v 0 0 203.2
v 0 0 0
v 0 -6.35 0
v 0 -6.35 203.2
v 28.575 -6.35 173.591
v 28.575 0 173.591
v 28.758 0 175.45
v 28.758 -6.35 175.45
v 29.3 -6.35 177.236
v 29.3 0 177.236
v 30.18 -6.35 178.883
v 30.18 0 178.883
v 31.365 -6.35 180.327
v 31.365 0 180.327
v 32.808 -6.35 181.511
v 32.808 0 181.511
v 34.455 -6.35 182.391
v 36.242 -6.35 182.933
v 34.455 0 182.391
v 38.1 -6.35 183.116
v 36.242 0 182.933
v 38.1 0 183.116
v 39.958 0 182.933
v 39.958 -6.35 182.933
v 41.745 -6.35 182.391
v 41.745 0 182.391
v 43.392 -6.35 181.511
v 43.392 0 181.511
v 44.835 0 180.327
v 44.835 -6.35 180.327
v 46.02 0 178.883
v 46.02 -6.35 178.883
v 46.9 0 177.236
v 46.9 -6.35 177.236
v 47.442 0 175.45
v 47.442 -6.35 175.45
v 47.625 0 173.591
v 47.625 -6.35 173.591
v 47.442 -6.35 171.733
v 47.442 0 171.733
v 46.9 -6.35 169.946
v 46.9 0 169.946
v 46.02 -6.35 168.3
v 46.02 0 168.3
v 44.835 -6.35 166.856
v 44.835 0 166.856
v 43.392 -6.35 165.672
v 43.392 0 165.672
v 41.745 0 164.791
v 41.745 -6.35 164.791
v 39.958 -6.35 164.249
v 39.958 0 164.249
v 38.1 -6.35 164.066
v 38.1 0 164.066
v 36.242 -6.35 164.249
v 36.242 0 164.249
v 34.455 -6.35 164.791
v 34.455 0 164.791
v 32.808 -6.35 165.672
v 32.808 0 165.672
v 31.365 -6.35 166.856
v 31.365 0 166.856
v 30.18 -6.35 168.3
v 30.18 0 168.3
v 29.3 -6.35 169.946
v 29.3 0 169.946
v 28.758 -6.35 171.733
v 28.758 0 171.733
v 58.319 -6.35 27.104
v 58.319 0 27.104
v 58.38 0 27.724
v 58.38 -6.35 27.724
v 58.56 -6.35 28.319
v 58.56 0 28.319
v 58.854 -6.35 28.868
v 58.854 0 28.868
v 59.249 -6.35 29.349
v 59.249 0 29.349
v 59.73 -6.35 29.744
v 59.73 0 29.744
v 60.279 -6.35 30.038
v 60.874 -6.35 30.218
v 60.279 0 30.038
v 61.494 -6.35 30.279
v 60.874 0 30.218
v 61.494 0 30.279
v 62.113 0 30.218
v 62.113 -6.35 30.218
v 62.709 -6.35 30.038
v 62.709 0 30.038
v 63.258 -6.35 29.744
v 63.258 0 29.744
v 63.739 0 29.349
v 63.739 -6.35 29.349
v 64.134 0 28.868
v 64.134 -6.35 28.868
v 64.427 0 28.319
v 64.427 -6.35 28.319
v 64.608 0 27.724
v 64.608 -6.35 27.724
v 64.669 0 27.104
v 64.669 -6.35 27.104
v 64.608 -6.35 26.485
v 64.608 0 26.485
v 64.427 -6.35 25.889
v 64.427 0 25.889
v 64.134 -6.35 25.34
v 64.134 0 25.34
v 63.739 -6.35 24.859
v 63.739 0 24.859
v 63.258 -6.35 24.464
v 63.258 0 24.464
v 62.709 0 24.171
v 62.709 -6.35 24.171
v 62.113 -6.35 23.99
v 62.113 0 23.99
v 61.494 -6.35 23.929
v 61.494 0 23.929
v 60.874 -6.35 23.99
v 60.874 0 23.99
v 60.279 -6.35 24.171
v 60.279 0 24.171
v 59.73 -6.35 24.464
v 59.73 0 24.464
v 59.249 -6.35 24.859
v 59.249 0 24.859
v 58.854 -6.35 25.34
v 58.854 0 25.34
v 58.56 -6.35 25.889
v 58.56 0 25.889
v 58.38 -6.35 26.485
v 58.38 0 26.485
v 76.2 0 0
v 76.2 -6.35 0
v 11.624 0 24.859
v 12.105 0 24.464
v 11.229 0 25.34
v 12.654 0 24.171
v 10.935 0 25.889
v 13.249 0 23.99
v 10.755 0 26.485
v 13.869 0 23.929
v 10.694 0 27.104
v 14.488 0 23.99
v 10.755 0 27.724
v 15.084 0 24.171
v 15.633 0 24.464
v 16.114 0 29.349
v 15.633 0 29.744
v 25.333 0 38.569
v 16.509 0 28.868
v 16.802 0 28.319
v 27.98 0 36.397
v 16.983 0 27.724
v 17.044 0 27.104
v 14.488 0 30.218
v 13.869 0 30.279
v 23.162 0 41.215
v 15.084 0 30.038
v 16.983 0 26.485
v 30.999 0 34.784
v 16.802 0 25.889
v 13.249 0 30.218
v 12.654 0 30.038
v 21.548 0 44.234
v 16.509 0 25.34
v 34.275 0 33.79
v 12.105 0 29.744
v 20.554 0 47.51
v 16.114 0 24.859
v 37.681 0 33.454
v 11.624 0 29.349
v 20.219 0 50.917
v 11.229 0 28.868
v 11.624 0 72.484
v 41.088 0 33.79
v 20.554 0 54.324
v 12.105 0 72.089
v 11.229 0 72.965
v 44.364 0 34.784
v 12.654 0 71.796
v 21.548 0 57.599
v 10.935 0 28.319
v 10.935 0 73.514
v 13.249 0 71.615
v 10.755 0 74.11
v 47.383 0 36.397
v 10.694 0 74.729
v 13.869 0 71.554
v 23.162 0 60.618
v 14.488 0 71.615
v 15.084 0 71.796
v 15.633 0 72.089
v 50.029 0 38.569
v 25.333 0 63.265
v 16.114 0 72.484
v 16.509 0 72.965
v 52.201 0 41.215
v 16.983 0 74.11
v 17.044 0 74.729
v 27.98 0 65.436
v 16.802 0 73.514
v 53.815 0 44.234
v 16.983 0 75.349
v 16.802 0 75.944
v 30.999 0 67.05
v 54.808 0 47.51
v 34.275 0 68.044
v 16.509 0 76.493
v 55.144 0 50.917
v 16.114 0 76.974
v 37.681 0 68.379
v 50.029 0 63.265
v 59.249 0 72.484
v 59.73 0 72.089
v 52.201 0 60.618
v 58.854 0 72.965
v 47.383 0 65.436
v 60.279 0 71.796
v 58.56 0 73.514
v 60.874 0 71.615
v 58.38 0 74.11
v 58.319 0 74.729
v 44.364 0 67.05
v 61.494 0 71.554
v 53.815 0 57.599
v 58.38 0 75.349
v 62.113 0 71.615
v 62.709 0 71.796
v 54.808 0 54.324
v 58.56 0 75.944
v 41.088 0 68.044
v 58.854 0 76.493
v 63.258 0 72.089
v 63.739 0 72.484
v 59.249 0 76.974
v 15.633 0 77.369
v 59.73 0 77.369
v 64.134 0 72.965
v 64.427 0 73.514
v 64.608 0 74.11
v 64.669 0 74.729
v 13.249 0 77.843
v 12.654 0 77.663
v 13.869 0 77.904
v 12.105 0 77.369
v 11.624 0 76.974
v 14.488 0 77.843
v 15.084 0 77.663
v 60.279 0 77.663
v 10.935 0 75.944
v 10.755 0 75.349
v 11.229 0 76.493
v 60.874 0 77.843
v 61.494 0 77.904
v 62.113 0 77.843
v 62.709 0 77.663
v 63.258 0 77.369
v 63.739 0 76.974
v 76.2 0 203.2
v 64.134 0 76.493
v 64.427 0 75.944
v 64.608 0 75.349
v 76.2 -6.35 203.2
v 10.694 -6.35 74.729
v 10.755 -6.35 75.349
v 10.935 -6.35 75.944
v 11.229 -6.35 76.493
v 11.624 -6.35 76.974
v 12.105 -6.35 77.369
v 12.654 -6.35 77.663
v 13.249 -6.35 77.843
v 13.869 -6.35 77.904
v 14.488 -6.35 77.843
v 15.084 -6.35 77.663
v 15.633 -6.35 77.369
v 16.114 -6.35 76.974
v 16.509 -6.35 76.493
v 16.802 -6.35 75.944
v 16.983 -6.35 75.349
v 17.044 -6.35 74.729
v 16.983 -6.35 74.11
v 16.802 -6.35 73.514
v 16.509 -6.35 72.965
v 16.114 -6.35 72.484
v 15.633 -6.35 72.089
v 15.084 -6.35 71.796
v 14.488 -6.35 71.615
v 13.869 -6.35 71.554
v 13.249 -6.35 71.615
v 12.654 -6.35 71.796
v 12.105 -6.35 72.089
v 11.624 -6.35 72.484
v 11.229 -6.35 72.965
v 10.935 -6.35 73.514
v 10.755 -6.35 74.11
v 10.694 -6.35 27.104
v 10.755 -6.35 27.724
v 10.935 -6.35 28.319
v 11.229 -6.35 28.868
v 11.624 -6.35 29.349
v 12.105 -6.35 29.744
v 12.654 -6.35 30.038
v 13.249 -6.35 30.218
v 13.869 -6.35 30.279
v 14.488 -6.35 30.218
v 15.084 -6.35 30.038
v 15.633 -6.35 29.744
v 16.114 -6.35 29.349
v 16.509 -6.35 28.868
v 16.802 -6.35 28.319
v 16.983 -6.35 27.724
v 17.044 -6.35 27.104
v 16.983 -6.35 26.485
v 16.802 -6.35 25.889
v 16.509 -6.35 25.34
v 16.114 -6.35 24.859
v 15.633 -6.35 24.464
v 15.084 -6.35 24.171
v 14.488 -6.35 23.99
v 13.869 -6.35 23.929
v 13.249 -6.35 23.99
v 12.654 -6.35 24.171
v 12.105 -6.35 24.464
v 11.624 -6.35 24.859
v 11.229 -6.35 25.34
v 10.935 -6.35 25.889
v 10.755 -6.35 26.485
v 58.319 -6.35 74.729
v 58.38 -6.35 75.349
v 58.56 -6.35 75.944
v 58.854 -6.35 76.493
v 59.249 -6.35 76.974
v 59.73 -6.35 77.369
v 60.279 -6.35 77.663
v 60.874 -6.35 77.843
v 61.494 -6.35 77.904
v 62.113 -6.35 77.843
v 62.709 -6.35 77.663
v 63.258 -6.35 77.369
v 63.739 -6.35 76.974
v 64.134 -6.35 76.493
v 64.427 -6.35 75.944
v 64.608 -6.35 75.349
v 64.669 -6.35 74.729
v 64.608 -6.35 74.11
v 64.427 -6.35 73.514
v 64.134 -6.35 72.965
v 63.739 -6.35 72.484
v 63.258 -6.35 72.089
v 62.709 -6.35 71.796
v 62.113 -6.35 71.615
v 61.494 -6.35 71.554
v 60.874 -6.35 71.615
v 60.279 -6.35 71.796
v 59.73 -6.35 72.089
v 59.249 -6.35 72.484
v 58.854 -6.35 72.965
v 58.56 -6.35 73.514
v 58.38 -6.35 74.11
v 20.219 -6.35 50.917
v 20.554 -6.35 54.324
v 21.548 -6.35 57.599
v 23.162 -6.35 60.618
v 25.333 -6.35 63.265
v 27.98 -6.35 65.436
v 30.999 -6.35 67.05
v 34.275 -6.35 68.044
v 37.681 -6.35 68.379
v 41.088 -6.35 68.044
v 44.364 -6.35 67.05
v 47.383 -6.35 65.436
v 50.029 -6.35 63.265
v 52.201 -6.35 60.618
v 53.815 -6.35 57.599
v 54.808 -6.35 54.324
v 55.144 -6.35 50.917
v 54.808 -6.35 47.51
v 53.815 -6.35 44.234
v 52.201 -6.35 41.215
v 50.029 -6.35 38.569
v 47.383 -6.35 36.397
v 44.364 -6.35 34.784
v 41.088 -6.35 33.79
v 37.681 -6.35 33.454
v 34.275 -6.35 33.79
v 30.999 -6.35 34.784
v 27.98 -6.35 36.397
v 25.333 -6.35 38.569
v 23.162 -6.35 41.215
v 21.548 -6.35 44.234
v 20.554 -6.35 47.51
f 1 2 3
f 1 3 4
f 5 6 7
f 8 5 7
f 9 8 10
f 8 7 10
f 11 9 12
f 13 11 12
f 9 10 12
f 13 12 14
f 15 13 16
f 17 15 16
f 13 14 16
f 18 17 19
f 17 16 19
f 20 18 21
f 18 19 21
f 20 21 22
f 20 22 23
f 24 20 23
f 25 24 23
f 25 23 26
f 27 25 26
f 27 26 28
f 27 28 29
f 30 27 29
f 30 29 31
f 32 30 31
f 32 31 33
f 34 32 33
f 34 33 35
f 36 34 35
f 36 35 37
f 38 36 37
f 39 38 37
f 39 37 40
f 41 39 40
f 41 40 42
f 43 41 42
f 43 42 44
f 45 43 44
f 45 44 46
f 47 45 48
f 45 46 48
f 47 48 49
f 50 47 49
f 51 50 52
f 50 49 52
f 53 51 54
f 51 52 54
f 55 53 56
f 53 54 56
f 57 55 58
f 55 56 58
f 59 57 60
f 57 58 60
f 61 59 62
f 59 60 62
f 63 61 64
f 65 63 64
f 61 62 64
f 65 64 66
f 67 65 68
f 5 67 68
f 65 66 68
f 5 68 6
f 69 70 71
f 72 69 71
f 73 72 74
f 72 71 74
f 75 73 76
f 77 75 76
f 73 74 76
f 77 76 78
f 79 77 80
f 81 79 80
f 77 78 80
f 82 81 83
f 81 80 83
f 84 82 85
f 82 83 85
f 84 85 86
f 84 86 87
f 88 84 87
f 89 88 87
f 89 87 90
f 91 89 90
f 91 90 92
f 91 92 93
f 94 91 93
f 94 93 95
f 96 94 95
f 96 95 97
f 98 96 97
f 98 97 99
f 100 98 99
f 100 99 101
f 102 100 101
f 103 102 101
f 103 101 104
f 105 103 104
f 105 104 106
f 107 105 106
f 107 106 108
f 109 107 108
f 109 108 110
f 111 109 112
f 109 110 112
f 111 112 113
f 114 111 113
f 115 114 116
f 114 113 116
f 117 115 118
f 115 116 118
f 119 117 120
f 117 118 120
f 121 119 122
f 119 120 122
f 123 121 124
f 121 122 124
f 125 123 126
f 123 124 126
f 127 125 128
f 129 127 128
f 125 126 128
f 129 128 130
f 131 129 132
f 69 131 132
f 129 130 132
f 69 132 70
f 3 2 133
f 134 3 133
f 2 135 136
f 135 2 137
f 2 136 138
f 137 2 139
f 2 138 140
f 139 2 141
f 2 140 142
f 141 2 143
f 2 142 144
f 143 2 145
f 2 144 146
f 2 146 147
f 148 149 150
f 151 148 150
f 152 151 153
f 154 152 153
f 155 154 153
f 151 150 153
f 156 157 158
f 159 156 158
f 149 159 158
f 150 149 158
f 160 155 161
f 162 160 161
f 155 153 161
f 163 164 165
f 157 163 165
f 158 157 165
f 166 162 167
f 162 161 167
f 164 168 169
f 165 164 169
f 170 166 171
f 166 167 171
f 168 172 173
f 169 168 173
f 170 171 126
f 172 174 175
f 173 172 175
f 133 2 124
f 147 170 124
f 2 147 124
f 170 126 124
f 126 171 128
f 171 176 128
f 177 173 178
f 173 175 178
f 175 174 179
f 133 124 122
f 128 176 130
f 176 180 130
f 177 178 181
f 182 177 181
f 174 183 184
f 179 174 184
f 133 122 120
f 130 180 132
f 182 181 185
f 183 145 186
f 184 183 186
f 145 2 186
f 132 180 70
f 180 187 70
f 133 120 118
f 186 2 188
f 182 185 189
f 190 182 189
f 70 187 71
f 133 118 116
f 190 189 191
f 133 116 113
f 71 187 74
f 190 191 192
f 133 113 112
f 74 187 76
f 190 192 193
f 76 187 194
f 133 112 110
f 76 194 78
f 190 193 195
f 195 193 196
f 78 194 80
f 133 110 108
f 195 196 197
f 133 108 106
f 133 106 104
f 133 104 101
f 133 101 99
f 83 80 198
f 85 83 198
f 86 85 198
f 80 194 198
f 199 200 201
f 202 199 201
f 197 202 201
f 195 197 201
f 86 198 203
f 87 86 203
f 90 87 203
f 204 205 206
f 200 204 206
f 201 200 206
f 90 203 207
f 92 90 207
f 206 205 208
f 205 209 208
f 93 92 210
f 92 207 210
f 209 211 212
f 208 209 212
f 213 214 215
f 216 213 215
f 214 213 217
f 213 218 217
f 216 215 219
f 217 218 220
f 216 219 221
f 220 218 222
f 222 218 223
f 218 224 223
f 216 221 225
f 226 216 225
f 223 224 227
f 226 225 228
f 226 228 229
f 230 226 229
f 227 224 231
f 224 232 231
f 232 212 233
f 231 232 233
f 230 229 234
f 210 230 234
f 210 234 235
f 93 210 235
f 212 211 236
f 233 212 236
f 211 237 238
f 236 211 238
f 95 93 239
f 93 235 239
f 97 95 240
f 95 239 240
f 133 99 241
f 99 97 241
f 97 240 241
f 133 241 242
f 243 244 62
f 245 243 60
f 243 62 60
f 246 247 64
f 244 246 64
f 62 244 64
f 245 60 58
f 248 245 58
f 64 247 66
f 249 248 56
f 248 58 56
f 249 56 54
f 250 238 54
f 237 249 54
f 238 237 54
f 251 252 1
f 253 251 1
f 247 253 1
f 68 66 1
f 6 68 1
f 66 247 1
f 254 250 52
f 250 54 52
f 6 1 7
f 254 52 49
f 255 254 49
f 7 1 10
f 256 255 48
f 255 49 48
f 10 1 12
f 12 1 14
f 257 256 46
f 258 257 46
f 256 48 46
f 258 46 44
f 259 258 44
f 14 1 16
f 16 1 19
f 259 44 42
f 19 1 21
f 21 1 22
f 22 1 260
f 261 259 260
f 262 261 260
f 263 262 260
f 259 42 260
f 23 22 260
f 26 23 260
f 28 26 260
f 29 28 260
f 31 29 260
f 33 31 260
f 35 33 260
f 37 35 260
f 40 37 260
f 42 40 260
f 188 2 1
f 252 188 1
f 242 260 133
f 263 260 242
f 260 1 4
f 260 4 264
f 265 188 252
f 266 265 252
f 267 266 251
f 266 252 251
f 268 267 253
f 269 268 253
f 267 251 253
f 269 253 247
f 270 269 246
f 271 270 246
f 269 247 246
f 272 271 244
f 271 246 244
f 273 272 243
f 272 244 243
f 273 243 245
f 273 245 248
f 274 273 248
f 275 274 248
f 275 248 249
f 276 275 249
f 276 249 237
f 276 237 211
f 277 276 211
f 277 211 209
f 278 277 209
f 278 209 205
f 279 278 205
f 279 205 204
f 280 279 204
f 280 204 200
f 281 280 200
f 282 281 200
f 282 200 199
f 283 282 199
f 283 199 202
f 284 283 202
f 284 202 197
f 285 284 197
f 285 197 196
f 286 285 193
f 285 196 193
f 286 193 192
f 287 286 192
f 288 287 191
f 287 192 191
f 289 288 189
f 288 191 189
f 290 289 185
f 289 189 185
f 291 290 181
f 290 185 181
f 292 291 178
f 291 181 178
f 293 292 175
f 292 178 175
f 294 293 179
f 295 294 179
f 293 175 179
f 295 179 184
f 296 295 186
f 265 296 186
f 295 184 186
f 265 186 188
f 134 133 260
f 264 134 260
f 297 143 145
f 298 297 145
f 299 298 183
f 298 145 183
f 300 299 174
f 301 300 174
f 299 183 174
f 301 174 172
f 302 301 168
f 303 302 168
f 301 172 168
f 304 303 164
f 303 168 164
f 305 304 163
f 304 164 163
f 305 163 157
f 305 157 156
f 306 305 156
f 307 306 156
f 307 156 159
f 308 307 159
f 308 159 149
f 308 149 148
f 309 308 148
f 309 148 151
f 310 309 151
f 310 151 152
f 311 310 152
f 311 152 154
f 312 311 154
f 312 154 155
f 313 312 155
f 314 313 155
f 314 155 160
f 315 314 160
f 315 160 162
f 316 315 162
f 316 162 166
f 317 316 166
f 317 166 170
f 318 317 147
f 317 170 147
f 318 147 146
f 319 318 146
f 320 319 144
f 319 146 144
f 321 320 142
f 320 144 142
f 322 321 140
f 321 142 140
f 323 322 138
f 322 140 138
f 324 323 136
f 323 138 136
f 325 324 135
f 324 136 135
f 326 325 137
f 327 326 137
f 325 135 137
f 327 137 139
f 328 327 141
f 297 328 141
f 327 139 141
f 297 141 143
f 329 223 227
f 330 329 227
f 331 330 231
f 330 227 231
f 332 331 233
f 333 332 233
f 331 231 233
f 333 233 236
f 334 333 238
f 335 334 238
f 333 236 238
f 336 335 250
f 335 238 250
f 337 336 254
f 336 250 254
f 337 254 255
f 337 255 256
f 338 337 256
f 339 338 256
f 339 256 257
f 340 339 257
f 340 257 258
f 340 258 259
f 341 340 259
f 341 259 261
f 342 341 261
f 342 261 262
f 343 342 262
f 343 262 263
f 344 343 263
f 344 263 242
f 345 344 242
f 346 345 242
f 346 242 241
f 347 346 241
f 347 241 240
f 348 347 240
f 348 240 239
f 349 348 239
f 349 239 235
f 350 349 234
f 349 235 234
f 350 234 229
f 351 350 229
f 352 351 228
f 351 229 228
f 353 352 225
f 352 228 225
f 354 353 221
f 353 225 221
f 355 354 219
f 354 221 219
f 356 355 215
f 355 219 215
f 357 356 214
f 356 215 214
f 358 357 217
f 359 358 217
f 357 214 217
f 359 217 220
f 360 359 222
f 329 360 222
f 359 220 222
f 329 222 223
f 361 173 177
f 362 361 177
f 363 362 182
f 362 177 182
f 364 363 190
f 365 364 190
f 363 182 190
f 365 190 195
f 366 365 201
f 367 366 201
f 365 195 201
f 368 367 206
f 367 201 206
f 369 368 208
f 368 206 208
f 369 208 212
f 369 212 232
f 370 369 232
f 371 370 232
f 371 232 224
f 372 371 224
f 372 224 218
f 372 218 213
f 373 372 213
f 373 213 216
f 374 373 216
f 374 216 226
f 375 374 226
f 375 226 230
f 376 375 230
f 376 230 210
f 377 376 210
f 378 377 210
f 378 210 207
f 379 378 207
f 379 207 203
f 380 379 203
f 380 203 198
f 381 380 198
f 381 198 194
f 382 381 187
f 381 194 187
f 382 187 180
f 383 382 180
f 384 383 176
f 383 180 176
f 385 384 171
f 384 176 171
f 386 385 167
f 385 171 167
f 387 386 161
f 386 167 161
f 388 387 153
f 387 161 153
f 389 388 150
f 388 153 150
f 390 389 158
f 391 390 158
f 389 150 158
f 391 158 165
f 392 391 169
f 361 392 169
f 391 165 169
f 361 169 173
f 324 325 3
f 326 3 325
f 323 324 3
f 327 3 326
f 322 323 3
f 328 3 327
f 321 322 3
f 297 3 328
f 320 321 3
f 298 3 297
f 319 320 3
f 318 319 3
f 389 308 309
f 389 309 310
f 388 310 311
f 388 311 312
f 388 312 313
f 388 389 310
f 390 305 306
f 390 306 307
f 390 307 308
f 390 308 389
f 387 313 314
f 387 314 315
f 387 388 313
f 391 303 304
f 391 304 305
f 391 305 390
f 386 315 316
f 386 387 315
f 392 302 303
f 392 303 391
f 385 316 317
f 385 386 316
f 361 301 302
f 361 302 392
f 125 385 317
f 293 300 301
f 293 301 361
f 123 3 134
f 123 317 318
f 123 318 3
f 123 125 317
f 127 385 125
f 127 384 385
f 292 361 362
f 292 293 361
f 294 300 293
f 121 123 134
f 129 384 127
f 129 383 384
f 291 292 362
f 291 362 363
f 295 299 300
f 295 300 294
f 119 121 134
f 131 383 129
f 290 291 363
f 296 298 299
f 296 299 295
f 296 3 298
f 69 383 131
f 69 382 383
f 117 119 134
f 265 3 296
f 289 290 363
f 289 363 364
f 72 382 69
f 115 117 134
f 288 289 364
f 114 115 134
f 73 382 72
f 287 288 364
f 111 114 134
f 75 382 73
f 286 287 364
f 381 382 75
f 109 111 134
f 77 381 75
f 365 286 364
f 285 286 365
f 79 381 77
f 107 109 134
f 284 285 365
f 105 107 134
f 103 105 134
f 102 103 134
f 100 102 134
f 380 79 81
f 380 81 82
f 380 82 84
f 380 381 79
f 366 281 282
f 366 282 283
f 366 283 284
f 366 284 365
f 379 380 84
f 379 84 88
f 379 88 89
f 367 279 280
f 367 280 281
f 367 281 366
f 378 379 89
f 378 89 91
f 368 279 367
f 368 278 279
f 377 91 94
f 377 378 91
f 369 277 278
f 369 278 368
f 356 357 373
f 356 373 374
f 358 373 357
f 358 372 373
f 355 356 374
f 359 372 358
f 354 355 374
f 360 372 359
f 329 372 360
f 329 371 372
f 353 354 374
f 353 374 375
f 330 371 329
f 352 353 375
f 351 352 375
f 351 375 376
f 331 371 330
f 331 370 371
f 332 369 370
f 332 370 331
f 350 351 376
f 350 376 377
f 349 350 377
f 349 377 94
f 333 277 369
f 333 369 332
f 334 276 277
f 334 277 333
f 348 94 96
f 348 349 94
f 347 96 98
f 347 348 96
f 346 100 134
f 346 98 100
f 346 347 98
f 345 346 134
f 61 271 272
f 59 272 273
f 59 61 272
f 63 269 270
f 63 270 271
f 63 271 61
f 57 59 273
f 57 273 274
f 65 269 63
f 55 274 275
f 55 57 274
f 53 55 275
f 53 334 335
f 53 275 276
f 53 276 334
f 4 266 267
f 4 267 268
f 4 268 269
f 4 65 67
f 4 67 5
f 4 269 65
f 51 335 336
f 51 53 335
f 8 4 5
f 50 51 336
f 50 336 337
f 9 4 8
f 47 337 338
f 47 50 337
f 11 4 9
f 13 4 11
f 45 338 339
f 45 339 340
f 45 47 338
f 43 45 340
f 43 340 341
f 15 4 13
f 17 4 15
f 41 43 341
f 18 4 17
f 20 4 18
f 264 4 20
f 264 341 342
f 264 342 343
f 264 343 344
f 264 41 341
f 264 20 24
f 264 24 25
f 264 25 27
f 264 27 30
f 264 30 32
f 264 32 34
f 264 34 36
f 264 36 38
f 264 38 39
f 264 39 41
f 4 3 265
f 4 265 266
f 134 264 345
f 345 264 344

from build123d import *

# Parameters (mm, degrees)
F0_W     = 76.2
F0_H     = 203.2
F1_DEPTH = 6.35
F3_D     = 6.35
F5_D     = 19.05
F7_D     = 34.925


with BuildPart() as f1:
    # F0 (on Front) → F1 (new body)
    with BuildSketch(Plane.XZ):
        with Locations((38.1, 101.6)):
            Rectangle(F0_W, F0_H)
    extrude(amount=F1_DEPTH)

    # F3 (through all)
    with Locations(Plane.XZ.offset(6.35)):
        with Locations((13.868812, 74.729279), (61.493812, 74.729279), (61.493812, 27.104279), (13.868812, 27.104279)):
            Hole(F3_D / 2)

    # F5 (through all)
    with Locations(Plane.XZ.offset(6.35)):
        with Locations((38.1, 173.591416)):
            Hole(F5_D / 2)

    # F7 (through all)
    with Locations(Plane.XZ.offset(6.35)):
        with Locations((37.681312, 50.916779)):
            Hole(F7_D / 2)


solid = f1.part
